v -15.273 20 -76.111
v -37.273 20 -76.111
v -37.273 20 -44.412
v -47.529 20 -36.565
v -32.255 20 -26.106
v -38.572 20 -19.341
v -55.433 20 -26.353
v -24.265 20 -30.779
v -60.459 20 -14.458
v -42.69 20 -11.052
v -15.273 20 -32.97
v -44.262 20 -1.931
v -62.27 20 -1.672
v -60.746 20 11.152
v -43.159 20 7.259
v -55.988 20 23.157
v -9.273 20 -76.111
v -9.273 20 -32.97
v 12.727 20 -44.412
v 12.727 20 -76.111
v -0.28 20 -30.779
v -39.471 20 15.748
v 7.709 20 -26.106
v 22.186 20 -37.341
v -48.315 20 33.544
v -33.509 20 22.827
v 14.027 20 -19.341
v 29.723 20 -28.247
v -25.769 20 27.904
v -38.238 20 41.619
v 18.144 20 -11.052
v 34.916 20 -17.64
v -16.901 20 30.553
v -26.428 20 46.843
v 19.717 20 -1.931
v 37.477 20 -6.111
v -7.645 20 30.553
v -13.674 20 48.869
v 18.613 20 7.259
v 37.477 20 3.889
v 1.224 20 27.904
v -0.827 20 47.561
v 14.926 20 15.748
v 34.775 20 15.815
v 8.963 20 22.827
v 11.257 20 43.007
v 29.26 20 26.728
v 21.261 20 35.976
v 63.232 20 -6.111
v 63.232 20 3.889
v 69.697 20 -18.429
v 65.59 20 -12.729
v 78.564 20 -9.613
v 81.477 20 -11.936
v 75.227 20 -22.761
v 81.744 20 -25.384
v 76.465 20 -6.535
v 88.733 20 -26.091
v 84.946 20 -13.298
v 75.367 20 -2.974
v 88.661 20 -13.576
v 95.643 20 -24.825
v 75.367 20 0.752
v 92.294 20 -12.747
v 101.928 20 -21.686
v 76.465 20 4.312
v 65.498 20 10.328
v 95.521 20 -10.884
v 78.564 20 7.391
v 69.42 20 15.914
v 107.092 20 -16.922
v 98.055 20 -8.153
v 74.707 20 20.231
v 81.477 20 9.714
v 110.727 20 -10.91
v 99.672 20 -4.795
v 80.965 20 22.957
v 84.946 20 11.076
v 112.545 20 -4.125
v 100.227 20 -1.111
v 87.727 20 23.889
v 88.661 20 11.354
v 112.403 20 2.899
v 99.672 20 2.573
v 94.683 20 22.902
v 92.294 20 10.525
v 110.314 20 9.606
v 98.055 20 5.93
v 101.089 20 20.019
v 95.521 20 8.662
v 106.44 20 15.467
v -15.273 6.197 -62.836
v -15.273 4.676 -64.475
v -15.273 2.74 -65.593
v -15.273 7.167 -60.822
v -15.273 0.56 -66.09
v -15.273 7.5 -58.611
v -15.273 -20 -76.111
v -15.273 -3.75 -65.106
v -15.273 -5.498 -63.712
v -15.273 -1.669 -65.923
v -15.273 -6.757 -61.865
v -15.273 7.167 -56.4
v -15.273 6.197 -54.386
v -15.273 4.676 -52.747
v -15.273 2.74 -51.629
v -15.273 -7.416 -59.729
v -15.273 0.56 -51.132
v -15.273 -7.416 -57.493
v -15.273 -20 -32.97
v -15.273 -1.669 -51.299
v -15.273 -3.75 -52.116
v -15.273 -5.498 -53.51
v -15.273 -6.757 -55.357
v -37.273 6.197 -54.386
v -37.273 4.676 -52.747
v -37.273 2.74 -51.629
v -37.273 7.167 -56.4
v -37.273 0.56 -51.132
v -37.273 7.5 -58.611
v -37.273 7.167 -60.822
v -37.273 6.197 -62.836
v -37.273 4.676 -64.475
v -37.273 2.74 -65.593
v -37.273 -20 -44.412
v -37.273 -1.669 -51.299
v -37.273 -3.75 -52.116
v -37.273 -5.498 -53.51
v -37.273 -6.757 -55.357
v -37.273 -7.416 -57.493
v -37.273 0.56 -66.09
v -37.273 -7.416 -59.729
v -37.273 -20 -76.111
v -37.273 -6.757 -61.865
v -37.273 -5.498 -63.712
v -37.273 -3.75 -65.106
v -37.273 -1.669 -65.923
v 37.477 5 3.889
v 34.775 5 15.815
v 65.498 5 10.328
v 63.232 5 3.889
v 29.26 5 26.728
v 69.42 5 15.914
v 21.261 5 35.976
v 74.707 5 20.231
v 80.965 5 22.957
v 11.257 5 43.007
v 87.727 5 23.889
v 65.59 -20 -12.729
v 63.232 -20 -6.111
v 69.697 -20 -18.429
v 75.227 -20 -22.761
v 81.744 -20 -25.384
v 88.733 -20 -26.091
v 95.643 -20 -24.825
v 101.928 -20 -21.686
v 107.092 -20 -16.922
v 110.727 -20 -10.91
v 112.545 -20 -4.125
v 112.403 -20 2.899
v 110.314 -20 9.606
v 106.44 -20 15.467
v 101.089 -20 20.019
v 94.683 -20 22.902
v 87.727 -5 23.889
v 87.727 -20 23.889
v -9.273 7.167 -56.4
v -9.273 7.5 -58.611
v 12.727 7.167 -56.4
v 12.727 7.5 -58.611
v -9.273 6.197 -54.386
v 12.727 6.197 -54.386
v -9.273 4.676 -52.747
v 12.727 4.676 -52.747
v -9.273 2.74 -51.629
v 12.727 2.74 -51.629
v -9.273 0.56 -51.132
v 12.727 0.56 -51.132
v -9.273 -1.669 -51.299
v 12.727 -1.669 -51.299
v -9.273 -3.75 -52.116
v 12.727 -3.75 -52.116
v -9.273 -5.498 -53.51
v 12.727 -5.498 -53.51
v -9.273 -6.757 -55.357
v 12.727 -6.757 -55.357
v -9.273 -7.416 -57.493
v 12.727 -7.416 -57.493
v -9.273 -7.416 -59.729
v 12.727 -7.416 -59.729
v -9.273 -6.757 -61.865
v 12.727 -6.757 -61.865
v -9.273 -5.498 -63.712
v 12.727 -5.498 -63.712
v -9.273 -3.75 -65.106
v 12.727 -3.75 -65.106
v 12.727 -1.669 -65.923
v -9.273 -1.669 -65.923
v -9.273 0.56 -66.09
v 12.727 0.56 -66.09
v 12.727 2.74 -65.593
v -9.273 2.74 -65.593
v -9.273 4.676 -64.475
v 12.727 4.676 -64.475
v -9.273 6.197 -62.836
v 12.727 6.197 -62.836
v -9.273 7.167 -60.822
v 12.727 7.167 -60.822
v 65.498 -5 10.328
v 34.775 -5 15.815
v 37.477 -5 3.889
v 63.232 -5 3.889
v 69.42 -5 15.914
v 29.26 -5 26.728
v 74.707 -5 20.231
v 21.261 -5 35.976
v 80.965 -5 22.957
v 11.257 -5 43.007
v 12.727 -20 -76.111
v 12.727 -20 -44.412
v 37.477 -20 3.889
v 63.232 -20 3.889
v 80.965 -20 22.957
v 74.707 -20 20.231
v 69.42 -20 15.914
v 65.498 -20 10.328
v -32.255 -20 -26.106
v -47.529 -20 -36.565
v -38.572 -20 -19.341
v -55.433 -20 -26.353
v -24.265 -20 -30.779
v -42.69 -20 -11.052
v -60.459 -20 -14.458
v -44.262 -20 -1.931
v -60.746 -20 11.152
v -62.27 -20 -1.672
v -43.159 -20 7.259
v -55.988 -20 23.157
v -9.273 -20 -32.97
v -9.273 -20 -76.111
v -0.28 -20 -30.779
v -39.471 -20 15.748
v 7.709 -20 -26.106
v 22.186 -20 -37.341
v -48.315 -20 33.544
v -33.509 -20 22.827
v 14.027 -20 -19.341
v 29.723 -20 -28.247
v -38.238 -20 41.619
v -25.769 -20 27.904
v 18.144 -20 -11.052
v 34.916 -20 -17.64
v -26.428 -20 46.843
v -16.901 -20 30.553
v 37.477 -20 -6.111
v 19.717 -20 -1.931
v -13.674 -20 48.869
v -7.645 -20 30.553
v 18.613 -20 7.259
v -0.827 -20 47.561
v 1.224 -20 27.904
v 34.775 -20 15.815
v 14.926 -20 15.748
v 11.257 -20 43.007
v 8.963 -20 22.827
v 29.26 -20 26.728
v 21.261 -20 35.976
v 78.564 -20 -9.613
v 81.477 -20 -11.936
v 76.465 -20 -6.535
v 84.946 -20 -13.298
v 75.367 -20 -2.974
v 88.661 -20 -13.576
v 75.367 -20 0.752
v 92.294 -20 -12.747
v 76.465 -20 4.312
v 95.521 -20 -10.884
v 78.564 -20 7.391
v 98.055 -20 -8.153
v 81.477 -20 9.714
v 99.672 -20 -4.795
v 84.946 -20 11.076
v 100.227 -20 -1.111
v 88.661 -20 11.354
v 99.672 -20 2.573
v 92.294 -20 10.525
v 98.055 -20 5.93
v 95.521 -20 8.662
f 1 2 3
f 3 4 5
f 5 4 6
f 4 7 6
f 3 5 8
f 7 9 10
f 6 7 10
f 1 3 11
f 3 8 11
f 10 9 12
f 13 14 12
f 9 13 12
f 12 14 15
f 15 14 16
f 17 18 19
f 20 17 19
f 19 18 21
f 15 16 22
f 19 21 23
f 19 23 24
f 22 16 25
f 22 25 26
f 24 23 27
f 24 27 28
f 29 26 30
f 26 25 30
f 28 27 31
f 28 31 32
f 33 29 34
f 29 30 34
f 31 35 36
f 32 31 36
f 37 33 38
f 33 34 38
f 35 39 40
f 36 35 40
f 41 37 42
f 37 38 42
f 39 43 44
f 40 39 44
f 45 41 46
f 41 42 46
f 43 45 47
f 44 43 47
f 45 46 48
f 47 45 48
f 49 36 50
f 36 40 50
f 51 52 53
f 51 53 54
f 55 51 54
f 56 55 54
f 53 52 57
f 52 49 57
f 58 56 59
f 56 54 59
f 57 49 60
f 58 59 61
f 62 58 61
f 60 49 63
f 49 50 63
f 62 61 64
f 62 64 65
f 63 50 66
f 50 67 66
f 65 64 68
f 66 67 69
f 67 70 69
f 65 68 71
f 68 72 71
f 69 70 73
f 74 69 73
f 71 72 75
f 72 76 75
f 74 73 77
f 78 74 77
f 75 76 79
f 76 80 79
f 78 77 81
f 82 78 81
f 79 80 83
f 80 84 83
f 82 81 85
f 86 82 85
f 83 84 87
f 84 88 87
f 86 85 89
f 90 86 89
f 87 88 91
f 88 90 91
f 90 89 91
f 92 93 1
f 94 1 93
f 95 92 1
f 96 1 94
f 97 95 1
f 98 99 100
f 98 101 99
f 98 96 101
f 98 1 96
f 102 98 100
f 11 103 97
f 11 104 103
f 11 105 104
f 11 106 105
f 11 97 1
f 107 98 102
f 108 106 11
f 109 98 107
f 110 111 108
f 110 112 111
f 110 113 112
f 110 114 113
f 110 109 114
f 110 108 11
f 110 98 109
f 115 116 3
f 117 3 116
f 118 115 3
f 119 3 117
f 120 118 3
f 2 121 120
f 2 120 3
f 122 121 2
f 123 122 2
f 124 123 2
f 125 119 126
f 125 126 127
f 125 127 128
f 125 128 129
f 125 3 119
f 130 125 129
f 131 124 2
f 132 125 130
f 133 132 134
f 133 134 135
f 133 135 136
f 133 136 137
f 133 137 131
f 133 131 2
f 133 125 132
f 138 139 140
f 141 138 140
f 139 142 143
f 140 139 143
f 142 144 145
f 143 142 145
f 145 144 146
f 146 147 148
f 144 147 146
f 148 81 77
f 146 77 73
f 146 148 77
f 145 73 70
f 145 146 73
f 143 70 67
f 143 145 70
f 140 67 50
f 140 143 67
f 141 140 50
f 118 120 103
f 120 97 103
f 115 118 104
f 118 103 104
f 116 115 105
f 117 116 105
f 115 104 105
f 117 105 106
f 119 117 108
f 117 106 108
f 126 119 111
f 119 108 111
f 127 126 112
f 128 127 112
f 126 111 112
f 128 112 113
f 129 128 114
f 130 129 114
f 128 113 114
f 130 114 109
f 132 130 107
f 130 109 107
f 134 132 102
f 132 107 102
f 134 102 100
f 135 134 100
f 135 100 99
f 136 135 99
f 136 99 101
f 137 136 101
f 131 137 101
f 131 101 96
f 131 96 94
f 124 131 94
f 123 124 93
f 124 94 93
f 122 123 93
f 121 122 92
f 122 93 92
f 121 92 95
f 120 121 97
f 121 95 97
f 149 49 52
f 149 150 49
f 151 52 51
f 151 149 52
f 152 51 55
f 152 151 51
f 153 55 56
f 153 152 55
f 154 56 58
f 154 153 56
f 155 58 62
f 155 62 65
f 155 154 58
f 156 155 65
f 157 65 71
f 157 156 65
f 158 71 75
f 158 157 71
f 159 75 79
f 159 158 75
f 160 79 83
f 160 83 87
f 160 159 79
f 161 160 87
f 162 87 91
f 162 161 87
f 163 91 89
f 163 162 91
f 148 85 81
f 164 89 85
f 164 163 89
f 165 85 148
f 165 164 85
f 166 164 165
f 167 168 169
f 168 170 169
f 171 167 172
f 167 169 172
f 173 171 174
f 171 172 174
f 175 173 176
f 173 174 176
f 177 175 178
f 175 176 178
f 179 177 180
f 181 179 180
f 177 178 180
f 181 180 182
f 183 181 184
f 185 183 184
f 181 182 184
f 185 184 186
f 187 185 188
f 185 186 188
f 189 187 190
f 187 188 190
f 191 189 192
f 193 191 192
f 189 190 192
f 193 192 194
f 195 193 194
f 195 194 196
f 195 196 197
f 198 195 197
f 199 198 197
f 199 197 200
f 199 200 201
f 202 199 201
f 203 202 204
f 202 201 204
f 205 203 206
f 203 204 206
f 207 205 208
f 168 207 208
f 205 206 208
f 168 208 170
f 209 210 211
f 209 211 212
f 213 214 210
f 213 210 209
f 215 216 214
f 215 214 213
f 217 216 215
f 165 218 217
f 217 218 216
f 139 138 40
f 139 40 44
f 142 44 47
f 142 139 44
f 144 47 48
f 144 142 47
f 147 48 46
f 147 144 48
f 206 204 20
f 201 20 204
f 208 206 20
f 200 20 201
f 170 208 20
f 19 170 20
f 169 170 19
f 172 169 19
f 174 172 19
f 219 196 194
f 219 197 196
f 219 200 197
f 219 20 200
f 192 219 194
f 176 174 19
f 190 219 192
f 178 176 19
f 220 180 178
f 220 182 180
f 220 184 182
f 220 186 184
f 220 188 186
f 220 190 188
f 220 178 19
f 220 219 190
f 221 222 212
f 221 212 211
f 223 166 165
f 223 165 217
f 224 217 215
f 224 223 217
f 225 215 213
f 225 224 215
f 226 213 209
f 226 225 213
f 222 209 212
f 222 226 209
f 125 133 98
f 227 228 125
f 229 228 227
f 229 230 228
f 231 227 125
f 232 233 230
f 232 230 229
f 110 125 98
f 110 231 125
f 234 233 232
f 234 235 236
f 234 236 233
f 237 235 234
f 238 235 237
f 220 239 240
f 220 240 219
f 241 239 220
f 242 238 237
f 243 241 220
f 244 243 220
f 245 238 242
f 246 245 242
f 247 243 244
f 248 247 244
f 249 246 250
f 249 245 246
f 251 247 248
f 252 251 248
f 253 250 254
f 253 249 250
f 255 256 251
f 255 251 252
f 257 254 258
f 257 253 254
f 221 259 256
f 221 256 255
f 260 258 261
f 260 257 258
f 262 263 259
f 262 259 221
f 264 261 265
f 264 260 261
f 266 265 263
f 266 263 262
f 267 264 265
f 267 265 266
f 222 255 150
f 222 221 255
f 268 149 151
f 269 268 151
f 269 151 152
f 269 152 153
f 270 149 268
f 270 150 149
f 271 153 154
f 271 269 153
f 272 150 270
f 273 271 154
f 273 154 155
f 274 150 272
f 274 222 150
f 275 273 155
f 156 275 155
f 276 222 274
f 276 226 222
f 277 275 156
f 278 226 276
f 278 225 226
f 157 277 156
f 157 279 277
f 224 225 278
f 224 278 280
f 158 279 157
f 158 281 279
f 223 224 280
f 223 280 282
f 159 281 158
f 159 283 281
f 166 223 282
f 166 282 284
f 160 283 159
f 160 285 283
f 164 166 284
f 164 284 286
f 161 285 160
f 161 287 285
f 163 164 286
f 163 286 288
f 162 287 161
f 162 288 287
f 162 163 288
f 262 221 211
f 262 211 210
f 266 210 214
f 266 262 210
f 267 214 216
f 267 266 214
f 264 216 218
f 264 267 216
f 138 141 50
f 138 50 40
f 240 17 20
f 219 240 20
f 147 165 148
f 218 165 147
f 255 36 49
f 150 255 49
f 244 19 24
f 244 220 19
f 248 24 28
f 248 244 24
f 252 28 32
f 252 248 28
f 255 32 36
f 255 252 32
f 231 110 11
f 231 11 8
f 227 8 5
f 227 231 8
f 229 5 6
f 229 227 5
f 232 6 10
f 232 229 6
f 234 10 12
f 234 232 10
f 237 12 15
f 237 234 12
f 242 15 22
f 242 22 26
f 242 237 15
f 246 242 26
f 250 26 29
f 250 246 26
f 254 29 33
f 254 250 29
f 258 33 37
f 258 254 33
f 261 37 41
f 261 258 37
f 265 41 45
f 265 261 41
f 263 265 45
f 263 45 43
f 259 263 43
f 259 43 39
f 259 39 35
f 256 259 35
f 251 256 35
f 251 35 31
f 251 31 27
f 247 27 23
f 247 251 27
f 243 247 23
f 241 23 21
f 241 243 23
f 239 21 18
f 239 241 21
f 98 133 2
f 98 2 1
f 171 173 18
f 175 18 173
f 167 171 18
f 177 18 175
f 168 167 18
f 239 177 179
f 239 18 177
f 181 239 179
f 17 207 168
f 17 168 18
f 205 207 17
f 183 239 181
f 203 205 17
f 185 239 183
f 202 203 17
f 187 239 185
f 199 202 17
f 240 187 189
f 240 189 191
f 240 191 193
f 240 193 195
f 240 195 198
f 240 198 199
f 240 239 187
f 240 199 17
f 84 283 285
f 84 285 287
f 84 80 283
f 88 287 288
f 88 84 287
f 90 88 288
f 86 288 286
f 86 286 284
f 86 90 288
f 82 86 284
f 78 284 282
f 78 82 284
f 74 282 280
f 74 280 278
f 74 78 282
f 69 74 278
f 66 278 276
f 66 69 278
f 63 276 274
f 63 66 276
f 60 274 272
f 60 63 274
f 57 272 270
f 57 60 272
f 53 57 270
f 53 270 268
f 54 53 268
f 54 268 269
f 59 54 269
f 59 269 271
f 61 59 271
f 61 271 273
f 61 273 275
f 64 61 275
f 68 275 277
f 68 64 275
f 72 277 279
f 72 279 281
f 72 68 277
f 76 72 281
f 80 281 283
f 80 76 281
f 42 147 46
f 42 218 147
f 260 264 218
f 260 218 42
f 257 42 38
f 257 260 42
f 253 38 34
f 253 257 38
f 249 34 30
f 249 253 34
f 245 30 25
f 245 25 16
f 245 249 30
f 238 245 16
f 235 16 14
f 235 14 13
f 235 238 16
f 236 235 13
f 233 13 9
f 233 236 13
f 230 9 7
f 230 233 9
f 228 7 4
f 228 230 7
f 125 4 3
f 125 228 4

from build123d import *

# Parameters (mm, degrees)
F0_R     = 12.5
F1_DEPTH = 20
F2_DEPTH = 5
F3_R     = 7.5
F4_DEPTH = 50


with BuildPart() as f1:
    # F0 (on Front) → F1 (new body, symmetric)
    with BuildSketch(Plane.XZ):
        with BuildLine():
            Line((63.232286, 3.888947), (37.476556, 3.888947))
            ThreePointArc((37.476556, 3.888947), (29.260214, 26.727902), (11.256595, 43.006594))
            ThreePointArc((11.256595, 43.006594), (-55.988459, 23.157086), (-37.272816, -44.412323))
            Line((-37.272816, -44.412323), (-37.272816, -76.111053))
            Line((-37.272816, -76.111053), (-15.272816, -76.111053))
            Line((-15.272816, -76.111053), (-15.272816, -32.970117))
            ThreePointArc((-15.272816, -32.970117), (-12.272816, 30.888947), (-9.272816, -32.970117))
            Line((-9.272816, -32.970117), (-9.272816, -33.111053))
            Line((-9.272816, -33.111053), (-9.272816, -76.111053))
            Line((-9.272816, -76.111053), (12.727184, -76.111053))
            Line((12.727184, -76.111053), (12.727184, -44.412323))
            ThreePointArc((12.727184, -44.412323), (29.722588, -28.247486), (37.476556, -6.111053))
            Line((37.476556, -6.111053), (63.232286, -6.111053))
            ThreePointArc((63.232286, -6.111053), (107.0921, -16.922441), (87.727184, 23.888947))
            ThreePointArc((87.727184, 23.888947), (71.915795, 18.253864), (63.232286, 3.888947))
        make_face()
        with Locations((87.727184, -1.111053)):
            Circle(F0_R, mode=Mode.SUBTRACT)
    extrude(amount=F1_DEPTH, both=True)

    # F0 (on Front) → F2 (join, symmetric)
    with BuildSketch(Plane.XZ):
        with BuildLine():
            ThreePointArc((11.256595, 43.006594), (29.260214, 26.727902), (37.476556, 3.888947))
            Line((37.476556, 3.888947), (63.232286, 3.888947))
            ThreePointArc((63.232286, 3.888947), (71.915795, 18.253864), (87.727184, 23.888947))
            Line((87.727184, 23.888947), (11.256595, 43.006594))
        make_face()
    extrude(amount=F2_DEPTH, both=True)

    # F3 (on Right) → F4 (cut, symmetric)
    with BuildSketch(Plane.YZ):
        with Locations((0, -58.611053)):
            Circle(F3_R)
    extrude(amount=F4_DEPTH, both=True, mode=Mode.SUBTRACT)


solid = f1.part
